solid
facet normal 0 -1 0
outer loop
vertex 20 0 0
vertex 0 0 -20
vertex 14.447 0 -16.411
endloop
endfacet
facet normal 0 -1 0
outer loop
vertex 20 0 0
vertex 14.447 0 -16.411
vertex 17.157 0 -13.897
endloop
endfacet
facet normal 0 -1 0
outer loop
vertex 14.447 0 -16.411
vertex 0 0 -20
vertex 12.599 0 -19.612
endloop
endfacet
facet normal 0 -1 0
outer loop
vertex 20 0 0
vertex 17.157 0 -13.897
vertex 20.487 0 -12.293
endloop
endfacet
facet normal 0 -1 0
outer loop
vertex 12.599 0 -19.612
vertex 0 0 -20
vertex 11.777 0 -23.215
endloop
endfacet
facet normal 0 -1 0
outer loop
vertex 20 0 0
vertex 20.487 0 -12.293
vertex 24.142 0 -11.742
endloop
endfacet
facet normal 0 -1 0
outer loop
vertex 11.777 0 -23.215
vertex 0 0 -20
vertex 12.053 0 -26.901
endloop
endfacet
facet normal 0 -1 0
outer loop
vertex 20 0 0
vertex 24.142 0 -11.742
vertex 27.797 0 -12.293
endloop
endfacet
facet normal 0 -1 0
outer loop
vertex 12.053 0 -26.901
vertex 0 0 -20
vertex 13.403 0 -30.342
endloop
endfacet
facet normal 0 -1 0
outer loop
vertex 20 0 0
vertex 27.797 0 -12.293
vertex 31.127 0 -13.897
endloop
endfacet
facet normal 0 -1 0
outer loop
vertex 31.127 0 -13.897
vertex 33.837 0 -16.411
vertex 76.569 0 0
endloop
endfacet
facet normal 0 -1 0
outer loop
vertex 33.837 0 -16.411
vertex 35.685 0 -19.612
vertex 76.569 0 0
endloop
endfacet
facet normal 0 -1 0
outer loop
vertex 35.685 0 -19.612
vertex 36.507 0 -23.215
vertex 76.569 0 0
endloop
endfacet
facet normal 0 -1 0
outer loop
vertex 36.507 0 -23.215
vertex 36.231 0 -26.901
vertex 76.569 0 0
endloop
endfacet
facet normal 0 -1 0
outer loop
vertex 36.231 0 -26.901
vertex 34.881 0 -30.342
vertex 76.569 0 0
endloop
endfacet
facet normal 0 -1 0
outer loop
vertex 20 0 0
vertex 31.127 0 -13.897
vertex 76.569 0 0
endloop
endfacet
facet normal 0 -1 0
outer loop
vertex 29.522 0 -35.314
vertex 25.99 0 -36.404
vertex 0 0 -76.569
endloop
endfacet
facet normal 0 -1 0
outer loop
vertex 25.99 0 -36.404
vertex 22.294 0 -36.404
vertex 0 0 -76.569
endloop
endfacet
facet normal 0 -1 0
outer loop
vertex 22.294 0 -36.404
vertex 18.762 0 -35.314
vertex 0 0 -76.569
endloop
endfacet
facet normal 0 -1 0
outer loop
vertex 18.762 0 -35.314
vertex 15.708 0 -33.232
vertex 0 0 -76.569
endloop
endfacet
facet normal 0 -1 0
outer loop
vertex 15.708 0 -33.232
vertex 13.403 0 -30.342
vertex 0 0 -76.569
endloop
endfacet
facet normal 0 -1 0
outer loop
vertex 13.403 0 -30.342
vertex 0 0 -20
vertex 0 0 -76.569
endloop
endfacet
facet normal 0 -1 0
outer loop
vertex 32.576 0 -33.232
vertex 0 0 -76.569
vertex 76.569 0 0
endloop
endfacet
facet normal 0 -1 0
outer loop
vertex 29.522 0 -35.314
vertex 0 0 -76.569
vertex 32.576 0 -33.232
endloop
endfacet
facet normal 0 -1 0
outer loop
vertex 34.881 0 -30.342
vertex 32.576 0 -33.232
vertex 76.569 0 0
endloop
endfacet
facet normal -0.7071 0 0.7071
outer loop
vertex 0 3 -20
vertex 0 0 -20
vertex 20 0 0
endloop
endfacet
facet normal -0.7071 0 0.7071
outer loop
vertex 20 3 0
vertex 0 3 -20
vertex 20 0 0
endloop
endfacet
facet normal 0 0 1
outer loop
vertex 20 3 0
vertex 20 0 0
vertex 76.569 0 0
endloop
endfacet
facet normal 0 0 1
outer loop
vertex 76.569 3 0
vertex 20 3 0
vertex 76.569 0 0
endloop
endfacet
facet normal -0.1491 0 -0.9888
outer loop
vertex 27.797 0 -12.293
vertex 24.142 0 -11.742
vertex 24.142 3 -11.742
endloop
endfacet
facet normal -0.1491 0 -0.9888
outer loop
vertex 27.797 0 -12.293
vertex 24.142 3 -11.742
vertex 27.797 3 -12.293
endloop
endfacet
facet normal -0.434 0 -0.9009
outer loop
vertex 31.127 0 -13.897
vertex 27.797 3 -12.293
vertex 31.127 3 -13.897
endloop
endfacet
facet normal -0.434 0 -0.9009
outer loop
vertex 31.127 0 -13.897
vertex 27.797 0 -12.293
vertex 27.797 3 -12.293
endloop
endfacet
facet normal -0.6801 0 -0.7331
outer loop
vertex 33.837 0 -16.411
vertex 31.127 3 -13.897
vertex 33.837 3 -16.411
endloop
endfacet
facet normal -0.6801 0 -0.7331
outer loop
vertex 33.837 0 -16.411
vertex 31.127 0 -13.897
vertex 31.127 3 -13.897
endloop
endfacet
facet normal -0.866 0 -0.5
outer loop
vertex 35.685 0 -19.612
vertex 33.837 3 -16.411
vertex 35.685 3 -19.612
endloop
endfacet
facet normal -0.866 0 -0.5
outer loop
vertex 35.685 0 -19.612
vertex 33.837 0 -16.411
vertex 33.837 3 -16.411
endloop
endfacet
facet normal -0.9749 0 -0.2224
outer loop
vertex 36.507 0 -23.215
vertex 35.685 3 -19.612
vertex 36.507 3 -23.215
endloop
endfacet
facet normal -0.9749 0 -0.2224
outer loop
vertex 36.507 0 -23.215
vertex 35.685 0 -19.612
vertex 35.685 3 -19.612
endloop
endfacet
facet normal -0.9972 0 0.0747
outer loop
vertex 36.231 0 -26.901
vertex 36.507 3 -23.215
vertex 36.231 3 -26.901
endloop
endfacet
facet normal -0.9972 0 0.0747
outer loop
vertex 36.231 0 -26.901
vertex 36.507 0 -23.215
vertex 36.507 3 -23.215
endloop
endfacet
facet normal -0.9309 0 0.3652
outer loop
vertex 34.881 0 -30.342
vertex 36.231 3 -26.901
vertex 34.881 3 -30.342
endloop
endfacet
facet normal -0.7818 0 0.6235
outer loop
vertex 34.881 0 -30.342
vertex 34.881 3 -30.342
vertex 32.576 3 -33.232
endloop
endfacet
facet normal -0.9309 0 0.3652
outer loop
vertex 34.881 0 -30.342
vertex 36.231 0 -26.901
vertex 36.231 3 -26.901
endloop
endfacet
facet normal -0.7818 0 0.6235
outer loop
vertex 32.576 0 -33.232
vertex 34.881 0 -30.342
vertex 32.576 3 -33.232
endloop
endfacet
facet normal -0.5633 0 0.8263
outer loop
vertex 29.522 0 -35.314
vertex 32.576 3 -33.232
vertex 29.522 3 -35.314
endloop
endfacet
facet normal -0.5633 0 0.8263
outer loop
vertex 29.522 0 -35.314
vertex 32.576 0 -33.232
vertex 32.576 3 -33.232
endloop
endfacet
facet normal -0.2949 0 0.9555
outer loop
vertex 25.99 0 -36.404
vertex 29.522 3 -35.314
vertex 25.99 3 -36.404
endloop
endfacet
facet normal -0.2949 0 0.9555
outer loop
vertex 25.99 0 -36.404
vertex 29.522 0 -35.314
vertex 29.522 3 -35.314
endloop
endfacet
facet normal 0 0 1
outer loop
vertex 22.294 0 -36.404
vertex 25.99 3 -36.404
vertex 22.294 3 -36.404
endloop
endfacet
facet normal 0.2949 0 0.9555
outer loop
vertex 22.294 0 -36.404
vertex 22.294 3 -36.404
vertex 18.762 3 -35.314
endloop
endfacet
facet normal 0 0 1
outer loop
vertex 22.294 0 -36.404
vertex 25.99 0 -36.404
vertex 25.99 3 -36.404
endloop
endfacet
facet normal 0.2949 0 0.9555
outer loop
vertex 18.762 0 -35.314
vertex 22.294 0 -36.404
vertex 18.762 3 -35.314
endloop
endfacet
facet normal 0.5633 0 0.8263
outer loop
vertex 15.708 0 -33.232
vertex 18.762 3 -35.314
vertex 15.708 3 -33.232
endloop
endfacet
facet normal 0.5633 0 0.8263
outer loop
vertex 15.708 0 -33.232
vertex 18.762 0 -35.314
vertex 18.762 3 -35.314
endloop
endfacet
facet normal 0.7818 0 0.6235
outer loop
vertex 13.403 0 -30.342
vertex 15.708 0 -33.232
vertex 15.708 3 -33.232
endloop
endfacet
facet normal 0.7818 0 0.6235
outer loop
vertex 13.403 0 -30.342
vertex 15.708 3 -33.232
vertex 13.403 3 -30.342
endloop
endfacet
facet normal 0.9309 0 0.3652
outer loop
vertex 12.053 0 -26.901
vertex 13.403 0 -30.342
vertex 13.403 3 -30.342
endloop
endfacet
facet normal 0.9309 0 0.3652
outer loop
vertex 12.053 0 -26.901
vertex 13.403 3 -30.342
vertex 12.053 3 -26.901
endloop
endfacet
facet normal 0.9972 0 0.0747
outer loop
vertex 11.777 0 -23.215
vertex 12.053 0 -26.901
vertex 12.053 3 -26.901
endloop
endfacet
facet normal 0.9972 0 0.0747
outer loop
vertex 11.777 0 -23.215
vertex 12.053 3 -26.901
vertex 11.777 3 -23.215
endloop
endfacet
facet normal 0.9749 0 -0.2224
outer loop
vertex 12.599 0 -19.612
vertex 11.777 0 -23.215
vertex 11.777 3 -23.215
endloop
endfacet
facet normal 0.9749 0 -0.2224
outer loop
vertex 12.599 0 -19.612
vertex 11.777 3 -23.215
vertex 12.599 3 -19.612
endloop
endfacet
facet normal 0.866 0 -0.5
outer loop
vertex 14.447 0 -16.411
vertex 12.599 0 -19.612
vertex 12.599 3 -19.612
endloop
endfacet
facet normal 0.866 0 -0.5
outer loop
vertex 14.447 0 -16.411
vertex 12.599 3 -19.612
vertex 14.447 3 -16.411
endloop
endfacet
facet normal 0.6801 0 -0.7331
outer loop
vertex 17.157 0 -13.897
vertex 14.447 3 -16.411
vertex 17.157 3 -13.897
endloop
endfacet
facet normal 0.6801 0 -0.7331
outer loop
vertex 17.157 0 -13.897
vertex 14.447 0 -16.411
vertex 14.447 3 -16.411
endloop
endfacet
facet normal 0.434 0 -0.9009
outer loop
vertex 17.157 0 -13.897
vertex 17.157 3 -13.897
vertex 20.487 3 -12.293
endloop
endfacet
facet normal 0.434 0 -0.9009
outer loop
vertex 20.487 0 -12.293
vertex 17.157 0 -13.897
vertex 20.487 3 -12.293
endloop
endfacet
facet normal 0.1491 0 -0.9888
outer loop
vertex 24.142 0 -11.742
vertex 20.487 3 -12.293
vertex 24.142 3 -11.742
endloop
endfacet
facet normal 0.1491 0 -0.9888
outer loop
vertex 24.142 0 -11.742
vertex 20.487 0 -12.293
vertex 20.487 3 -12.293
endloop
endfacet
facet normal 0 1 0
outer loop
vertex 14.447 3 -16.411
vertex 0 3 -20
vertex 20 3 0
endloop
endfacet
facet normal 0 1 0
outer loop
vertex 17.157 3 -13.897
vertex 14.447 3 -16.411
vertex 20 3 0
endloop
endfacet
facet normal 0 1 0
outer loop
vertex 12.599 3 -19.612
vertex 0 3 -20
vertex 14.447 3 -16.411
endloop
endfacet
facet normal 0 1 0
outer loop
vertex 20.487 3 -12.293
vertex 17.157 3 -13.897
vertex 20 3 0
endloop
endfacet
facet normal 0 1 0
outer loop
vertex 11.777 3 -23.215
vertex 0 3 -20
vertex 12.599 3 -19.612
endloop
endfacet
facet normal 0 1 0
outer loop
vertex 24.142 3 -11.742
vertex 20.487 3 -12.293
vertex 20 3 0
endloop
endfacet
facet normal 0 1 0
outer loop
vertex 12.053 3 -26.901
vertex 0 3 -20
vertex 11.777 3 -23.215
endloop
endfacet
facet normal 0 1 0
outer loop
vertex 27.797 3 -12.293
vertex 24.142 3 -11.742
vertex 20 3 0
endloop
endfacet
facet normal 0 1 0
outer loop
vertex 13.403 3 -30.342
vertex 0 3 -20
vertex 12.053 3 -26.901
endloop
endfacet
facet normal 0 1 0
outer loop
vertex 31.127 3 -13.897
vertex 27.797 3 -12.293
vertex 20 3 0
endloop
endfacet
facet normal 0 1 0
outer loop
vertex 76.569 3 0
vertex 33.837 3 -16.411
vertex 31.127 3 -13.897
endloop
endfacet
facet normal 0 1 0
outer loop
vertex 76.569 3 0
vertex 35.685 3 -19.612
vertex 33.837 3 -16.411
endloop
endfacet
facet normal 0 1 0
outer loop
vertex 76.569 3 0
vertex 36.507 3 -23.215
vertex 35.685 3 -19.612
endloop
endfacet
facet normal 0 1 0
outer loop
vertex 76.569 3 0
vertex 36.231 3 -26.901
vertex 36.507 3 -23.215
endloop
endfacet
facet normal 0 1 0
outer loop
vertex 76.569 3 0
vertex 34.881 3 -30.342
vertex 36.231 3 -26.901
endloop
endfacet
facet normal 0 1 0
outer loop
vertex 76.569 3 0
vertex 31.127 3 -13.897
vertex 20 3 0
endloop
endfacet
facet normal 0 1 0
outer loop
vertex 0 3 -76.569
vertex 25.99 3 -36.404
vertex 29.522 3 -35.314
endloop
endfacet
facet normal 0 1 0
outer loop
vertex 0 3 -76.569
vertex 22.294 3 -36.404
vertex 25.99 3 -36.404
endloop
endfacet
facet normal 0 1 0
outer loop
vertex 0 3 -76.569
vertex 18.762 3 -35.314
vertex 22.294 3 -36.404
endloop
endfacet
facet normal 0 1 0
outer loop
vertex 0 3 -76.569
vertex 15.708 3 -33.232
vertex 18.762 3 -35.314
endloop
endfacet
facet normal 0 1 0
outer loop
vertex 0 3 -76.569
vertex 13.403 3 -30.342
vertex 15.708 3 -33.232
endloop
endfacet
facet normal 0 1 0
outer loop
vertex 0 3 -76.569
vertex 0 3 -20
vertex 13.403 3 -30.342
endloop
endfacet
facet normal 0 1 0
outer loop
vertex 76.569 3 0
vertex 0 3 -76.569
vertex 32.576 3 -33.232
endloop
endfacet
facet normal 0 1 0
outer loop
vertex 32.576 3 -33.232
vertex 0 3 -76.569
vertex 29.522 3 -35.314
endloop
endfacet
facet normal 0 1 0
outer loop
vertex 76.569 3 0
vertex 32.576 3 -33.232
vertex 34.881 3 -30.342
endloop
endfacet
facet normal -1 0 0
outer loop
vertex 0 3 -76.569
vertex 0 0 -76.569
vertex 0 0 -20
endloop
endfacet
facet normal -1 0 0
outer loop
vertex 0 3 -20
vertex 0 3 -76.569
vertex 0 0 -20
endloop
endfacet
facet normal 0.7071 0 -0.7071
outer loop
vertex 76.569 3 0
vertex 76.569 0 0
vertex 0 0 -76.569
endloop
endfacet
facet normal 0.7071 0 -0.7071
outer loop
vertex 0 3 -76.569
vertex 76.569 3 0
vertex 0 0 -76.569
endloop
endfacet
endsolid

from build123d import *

# Parameters (mm, degrees)
SKETCH_1_R      = 12.4
EXTRUDE_1_DEPTH = 3


with BuildPart() as part:
    # 草圖1 → 填料-伸長1 (new body)
    with BuildSketch(Plane(origin=(0, 0, 0), x_dir=(1, 0, 0), z_dir=(0, 1, 0))):
        Polygon((0, 76.568542495), (0, 20), (20, 0), (76.568542495, 0), align=None)
        with Locations(Location((24.142135624, 24.142135624, 0), (0, 0, 270))):
            Circle(SKETCH_1_R, mode=Mode.SUBTRACT)
    extrude(amount=EXTRUDE_1_DEPTH)


solid = part.part
